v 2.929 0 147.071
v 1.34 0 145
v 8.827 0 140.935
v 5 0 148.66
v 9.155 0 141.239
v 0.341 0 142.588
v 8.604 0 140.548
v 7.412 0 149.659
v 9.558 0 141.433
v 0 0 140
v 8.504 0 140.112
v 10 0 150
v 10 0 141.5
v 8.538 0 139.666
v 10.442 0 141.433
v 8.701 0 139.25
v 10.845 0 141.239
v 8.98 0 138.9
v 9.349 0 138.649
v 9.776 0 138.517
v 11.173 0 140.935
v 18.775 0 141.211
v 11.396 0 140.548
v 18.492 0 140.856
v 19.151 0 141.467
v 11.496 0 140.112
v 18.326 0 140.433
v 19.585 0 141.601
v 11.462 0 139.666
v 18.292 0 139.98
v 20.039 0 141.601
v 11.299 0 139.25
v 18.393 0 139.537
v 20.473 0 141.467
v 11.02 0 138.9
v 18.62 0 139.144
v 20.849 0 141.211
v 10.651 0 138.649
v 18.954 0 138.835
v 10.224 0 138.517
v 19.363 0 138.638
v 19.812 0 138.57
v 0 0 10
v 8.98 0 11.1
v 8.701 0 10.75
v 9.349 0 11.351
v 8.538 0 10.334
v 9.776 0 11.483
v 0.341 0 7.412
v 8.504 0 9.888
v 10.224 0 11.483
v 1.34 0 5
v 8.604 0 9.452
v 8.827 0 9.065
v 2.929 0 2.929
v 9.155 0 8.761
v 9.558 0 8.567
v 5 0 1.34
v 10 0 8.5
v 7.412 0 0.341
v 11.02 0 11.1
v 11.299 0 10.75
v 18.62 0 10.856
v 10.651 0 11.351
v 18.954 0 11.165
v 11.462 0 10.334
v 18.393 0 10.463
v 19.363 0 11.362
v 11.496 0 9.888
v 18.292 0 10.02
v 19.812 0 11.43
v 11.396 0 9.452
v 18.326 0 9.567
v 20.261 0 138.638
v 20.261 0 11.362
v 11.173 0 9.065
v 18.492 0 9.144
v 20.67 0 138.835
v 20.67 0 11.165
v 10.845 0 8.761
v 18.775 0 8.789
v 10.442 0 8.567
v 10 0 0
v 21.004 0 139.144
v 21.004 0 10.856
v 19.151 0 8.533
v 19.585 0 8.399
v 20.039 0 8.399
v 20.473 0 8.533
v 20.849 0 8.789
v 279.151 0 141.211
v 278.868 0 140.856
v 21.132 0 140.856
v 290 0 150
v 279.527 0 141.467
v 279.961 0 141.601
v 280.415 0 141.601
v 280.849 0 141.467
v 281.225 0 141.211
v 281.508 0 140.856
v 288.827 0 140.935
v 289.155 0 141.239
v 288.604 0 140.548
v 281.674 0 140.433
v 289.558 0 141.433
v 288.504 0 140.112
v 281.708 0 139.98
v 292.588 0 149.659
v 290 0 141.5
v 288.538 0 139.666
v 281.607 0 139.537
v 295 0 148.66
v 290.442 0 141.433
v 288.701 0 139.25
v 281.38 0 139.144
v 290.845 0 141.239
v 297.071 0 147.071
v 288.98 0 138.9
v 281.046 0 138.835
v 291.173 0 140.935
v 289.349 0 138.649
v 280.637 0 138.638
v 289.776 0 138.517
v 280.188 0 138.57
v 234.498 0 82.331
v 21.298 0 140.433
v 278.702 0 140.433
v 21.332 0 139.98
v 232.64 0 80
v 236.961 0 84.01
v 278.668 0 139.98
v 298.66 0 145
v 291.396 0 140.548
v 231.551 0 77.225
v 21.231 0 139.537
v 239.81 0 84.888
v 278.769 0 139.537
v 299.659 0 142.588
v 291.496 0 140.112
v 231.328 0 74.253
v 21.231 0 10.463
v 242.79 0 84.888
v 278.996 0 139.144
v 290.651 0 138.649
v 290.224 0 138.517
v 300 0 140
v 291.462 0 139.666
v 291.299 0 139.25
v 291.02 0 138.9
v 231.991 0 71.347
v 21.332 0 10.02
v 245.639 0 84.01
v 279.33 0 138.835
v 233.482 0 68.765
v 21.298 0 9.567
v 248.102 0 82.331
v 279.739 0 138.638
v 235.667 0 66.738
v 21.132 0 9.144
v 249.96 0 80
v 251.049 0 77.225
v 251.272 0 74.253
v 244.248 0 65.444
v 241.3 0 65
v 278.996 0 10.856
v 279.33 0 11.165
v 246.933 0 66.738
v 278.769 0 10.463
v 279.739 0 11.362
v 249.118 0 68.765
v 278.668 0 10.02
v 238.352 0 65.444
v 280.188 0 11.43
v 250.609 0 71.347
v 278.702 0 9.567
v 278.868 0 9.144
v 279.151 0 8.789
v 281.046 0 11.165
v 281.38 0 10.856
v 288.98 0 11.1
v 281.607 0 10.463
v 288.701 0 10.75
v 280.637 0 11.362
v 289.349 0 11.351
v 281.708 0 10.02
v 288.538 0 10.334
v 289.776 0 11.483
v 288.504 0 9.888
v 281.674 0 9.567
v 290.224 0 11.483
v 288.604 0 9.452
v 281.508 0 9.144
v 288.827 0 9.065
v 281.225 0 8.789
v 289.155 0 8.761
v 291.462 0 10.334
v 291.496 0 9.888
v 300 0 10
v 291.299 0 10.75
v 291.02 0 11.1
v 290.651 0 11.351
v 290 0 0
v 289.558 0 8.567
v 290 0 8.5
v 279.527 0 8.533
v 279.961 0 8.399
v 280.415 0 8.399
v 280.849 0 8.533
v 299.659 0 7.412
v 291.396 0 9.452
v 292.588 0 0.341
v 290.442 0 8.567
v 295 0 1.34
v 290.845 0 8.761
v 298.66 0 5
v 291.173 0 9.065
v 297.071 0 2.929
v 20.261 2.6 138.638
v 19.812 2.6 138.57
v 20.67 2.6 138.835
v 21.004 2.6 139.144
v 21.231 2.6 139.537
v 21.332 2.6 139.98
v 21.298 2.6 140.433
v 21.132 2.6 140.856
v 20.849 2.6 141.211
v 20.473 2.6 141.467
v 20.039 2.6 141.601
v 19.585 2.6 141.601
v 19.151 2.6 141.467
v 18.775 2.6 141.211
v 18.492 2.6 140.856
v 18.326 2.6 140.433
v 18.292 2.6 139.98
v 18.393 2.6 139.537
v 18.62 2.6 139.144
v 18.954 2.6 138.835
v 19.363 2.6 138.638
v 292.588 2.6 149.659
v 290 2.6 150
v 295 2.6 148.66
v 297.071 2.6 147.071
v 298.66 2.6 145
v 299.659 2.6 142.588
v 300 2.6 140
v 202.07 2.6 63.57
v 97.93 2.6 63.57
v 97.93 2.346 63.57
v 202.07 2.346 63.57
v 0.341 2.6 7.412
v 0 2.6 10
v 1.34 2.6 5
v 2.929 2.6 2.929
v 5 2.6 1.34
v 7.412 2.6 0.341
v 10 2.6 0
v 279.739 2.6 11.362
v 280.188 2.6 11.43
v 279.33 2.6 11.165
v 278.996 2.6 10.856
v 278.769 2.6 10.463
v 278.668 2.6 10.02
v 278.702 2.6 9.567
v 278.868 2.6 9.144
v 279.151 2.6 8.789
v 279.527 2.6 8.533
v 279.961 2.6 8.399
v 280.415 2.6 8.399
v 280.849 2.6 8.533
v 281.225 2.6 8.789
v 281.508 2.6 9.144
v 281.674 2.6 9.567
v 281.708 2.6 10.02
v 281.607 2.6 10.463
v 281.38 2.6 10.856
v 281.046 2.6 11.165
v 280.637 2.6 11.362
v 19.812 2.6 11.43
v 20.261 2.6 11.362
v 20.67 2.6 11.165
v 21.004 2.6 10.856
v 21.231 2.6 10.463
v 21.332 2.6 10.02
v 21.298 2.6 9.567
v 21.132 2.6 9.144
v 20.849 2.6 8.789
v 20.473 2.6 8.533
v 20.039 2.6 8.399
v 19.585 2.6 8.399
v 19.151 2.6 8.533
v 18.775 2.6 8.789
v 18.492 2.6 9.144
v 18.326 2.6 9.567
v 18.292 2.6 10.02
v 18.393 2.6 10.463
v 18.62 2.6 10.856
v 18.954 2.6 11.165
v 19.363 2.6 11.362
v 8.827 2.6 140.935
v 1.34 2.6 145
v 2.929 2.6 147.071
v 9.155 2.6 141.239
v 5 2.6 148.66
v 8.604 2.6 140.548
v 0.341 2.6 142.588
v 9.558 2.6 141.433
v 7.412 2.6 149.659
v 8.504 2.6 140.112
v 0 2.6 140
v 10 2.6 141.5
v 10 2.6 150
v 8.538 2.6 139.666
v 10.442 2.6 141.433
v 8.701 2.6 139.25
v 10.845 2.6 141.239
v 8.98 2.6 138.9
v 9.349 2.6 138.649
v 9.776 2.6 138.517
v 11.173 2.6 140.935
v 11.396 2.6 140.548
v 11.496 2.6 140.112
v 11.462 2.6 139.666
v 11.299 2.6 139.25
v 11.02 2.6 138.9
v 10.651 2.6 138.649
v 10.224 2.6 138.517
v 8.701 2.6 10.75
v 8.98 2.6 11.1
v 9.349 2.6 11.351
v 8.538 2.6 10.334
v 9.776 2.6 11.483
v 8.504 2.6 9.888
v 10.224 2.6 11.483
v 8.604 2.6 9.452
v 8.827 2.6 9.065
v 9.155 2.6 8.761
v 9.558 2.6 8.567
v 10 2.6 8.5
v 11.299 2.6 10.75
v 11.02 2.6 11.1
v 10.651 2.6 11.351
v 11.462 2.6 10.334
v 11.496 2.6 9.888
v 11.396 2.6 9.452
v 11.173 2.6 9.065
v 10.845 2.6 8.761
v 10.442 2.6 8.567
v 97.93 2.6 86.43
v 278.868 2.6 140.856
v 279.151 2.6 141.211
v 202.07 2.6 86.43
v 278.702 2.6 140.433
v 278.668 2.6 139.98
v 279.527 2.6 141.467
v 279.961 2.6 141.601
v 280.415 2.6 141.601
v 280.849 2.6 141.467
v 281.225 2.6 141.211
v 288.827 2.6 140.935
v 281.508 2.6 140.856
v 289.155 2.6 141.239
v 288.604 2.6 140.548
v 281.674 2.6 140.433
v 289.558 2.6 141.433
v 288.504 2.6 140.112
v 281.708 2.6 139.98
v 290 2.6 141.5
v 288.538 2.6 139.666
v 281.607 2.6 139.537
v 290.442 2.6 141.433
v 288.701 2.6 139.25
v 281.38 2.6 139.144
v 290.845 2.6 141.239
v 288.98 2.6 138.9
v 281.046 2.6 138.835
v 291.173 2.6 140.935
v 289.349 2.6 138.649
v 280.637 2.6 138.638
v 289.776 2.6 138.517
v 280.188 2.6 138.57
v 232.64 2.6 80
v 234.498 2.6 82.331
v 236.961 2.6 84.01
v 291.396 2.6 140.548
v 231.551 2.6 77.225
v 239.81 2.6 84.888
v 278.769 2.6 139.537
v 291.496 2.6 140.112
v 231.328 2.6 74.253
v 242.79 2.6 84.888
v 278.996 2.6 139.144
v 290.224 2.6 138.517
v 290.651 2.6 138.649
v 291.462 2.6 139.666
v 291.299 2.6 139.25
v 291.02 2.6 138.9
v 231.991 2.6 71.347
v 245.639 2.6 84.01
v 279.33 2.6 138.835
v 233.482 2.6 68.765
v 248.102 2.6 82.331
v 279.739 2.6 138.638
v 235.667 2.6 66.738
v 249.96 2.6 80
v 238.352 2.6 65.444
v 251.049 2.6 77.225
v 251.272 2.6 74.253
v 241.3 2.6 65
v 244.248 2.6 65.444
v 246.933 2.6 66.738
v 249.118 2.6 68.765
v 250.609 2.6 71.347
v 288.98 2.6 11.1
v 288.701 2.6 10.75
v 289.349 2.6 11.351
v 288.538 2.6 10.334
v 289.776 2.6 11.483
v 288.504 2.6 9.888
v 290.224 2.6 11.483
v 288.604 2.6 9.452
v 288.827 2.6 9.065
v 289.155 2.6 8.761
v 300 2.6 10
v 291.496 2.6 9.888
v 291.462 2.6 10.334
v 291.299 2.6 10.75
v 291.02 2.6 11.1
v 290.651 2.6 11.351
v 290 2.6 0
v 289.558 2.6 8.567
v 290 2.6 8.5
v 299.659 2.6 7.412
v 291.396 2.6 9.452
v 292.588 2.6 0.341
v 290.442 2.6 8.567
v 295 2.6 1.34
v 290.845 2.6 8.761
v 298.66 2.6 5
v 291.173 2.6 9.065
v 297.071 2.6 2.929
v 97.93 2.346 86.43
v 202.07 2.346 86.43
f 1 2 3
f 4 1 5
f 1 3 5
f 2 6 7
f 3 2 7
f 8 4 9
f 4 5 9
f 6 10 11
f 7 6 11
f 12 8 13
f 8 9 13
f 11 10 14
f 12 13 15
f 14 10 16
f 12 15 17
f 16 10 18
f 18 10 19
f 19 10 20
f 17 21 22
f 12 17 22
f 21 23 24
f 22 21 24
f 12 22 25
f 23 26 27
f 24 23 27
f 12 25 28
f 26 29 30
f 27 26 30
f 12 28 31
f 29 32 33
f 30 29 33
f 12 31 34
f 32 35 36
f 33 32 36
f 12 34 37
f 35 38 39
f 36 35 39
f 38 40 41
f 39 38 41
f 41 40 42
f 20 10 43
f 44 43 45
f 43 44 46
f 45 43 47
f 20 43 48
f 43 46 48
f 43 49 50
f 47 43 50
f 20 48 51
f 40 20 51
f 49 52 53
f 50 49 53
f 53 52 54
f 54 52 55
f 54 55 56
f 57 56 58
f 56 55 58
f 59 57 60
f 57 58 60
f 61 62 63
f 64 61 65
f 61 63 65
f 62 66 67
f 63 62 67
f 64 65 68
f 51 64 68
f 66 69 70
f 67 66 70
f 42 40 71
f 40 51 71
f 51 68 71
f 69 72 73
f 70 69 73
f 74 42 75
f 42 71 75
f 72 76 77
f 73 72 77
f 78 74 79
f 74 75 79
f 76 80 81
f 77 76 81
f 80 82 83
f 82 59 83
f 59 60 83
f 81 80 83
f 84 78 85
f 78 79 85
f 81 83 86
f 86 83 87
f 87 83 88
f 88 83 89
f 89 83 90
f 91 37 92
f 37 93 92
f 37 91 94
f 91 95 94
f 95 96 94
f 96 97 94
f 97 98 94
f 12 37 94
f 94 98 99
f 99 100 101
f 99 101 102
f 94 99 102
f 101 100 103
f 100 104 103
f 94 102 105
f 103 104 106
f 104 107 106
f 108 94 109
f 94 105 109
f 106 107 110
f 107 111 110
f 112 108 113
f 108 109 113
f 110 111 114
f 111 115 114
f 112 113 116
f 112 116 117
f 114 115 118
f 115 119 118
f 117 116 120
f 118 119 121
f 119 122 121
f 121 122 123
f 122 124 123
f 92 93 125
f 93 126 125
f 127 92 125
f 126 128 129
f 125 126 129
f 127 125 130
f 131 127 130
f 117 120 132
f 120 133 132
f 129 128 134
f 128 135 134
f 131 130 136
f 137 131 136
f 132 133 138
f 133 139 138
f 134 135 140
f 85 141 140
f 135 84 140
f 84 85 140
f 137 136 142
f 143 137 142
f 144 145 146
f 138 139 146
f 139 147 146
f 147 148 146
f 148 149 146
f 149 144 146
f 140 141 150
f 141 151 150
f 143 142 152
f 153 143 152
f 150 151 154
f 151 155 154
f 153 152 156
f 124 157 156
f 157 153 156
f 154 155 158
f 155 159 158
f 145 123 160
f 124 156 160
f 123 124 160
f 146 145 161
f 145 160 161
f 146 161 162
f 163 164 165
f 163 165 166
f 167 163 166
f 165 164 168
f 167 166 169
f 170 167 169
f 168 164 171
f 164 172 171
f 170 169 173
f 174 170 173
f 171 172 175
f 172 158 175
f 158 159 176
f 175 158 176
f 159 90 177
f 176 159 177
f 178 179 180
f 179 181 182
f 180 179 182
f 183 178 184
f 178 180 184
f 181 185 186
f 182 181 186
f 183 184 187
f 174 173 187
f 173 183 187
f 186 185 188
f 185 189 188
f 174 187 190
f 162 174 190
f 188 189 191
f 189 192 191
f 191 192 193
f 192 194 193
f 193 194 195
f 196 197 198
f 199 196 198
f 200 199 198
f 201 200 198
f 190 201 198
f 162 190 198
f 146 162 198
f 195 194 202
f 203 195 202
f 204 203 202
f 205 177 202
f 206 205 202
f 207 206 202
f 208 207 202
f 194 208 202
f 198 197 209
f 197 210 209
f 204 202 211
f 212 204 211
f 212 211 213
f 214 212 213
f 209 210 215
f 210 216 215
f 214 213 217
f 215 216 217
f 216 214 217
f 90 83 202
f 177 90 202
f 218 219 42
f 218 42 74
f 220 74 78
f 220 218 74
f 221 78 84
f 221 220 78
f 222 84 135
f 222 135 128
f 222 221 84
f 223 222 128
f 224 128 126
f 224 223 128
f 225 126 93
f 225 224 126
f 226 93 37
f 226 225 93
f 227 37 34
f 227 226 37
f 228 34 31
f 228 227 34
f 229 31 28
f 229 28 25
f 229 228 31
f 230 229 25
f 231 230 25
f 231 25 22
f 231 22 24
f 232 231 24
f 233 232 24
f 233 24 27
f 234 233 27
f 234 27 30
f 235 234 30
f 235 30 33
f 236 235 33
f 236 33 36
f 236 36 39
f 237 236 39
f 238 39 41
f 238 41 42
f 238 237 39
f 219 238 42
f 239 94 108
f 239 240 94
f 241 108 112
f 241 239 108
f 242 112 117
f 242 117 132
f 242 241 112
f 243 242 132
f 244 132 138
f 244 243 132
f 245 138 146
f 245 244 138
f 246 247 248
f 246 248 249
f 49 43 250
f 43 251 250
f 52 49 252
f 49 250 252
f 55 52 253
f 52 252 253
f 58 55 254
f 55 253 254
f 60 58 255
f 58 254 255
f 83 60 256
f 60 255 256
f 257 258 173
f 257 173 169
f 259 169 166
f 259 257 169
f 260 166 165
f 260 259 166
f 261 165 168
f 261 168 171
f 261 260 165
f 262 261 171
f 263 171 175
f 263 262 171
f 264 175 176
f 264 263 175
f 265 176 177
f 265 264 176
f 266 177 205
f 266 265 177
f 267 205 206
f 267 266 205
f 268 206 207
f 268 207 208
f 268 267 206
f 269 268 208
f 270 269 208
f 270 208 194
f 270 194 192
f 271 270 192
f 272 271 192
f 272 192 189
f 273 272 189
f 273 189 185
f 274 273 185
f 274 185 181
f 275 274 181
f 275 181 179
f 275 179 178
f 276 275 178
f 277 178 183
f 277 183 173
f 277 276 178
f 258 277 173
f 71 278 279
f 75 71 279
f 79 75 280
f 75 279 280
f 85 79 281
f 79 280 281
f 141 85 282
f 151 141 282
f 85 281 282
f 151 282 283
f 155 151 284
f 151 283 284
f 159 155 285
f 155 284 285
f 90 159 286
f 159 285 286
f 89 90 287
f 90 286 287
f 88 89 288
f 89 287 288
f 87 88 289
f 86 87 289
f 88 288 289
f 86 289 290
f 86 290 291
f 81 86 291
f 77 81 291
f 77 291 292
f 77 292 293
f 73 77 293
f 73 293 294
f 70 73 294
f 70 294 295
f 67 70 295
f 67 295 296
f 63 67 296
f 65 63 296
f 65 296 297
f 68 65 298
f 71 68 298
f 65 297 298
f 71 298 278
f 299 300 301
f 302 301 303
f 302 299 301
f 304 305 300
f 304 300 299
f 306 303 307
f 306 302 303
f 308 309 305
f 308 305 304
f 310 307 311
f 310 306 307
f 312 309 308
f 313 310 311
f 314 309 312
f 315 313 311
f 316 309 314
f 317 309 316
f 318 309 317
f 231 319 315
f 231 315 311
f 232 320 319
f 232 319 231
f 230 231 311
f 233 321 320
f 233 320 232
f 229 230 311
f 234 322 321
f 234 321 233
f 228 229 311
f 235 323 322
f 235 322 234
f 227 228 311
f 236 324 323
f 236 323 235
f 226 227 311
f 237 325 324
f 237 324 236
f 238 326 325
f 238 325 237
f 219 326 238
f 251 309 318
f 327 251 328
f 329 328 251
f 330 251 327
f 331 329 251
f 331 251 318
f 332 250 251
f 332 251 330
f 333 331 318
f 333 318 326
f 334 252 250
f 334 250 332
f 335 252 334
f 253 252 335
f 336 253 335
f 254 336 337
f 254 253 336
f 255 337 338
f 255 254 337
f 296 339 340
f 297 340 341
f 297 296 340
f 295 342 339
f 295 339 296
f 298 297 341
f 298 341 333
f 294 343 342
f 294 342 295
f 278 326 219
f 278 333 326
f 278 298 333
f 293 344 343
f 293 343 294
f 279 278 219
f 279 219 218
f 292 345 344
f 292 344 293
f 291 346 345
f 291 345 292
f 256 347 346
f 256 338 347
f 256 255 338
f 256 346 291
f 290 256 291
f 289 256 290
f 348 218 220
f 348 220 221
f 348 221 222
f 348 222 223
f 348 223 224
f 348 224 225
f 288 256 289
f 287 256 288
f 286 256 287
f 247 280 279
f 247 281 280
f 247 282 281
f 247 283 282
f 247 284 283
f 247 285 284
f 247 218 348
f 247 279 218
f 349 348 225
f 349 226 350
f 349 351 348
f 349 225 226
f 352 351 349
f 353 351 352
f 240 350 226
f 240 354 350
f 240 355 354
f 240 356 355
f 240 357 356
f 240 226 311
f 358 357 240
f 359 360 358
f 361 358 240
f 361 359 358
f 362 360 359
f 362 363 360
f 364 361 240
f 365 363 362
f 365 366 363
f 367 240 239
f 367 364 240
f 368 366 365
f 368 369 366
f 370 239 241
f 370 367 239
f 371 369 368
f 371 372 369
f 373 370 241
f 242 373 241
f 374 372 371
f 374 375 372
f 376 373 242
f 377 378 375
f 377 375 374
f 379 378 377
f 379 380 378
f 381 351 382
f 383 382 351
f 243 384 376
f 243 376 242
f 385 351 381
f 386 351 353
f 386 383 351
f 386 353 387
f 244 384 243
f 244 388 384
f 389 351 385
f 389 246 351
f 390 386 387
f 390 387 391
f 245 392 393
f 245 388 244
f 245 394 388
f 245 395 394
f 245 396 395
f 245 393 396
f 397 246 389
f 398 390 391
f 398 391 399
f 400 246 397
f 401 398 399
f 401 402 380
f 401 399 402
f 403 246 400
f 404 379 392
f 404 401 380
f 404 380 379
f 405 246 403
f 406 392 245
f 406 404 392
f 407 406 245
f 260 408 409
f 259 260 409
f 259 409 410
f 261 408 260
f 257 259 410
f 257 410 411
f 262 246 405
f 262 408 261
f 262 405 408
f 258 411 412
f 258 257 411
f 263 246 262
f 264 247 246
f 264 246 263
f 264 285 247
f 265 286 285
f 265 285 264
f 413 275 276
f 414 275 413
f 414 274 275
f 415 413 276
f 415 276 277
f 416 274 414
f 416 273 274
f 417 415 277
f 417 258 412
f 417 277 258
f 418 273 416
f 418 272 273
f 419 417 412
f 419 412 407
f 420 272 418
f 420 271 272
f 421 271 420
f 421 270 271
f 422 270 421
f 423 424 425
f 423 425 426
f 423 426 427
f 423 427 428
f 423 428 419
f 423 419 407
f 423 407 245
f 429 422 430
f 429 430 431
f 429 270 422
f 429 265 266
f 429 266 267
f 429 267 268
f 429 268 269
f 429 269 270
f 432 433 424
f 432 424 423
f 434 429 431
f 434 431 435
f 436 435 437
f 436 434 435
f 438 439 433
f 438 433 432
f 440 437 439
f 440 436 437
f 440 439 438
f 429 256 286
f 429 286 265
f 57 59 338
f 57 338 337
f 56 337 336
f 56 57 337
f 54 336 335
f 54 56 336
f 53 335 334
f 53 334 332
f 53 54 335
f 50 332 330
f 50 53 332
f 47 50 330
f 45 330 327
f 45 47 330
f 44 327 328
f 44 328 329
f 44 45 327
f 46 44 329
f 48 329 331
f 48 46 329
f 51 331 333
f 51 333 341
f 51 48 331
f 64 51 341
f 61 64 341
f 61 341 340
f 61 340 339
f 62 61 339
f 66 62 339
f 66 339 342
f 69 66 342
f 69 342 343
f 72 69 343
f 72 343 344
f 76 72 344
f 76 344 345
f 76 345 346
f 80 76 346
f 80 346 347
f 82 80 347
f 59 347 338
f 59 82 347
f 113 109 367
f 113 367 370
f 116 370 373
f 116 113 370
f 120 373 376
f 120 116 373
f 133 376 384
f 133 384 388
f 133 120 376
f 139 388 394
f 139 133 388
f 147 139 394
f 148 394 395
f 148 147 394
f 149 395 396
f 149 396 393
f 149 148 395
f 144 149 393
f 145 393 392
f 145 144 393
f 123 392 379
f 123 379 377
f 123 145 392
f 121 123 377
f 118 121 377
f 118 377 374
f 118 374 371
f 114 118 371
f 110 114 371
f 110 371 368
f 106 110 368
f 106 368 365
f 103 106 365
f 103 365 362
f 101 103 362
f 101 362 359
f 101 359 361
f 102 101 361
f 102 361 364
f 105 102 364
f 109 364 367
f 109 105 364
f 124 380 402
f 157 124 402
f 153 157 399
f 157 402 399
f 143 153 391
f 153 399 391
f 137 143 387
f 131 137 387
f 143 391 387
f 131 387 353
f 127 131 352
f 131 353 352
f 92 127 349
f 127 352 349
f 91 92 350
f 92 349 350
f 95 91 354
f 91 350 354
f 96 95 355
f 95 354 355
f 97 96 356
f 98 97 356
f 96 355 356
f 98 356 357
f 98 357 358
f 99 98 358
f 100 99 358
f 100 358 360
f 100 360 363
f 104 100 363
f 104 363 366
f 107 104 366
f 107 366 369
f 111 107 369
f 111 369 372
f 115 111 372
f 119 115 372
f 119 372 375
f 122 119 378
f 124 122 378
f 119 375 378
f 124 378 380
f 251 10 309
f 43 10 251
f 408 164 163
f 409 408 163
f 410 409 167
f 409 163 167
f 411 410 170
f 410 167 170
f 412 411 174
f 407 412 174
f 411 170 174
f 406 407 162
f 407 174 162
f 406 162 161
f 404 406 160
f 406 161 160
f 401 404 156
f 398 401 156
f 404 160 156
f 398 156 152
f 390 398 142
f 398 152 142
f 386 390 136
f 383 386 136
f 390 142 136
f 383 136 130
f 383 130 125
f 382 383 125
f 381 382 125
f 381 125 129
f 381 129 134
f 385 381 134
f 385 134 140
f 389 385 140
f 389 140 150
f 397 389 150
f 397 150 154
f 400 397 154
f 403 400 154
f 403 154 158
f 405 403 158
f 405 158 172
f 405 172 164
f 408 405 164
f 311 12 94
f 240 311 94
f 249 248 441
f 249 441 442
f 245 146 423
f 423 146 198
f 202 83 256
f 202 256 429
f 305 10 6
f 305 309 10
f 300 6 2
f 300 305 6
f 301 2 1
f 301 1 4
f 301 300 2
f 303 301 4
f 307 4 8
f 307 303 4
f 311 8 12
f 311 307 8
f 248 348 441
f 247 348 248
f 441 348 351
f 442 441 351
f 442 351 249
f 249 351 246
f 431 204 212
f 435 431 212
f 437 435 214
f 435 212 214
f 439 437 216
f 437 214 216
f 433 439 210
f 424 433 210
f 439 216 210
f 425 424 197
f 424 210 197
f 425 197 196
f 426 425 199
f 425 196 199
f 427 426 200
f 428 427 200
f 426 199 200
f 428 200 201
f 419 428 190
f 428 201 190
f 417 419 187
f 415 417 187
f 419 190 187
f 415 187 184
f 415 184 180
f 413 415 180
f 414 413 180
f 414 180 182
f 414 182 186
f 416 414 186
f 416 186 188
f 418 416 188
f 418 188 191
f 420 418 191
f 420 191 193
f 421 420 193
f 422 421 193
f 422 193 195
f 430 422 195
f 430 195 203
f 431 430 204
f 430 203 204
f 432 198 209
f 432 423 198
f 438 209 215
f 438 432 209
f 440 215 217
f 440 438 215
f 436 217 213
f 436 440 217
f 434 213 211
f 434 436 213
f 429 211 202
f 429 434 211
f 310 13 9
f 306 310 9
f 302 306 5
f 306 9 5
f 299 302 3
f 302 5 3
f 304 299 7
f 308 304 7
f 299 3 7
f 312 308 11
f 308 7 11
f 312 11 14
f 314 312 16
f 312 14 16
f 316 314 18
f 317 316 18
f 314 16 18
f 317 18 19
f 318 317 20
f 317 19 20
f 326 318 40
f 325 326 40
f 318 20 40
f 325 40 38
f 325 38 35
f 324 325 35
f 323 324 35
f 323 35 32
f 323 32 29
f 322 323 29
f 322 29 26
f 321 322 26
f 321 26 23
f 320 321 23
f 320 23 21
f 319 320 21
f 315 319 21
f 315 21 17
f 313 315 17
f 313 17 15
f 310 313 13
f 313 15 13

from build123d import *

# Parameters (mm, degrees)
SKETCH1_W               = 300
SKETCH1_H               = 150
BOSS_EXTRUDE1_DEPTH     = 2.6
FILLET1_R               = 10
SKETCH6_R               = 1.5
CUT_EXTRUDE6_DEPTH      = 2.6
MIRROR6_COPY_1_SKETCH_R = 1.5
MIRROR6_COPY_1_DEPTH    = 2.6
SKETCH23_R              = 1.524
CUT_EXTRUDE16_DEPTH     = 2.59999988
MIRROR8_COPY_1_SKETCH_R = 1.524
MIRROR8_COPY_1_DEPTH    = 2.59999988
SKETCH15_R              = 10
CUT_EXTRUDE19_DEPTH     = 336.420273687
SKETCH25_W              = 104.14
SKETCH25_H              = 22.86
CUT_EXTRUDE20_DEPTH     = 0.254


with BuildPart() as part:
    # Sketch1 → Boss-Extrude1 (new body)
    with BuildSketch(Plane(origin=(0, 0, 0), x_dir=(1, 0, 0), z_dir=(0, 1, 0))):
        with Locations((150, -75)):
            Rectangle(SKETCH1_W, SKETCH1_H)
    extrude(amount=BOSS_EXTRUDE1_DEPTH)

    # Fillet1
    fillet1_edges = [part.edges().sort_by_distance(p)[0] for p in [
        (0, 1.3, 0),
        (300, 1.3, 0),
        (300, 1.3, 150),
        (0, 1.3, 150),
    ]]
    fillet(fillet1_edges, radius=FILLET1_R)

    # Sketch6 → Cut-Extrude6 (cut)
    with BuildSketch(Plane.XZ):
        with Locations(Location((290, 10, 0), (0, 0, 270))):
            Circle(SKETCH6_R)
    cut_extrude6 = extrude(amount=-CUT_EXTRUDE6_DEPTH, mode=Mode.SUBTRACT)

    # Mirror5: Cut-Extrude6 across plane
    add(cut_extrude6.mirror(Plane(origin=(150, 0, 0), x_dir=(0, 0, 1), z_dir=(1, 0, 0))), mode=Mode.SUBTRACT)

    # Mirror6: Cut-Extrude6 across plane
    add(cut_extrude6.mirror(Plane.XY.offset(75)), mode=Mode.SUBTRACT)

    # Mirror6 copy 1 sketch → Mirror6 copy 1 (cut)
    with BuildSketch(Plane(origin=(300, 0, 150), x_dir=(-1, 0, 0), z_dir=(0, -1, 0))):
        with Locations(Location((290, 10, 0), (0, 0, 270))):
            Circle(MIRROR6_COPY_1_SKETCH_R)
    extrude(amount=-MIRROR6_COPY_1_DEPTH, mode=Mode.SUBTRACT)

    # Sketch23 → Cut-Extrude16 (cut)
    with BuildSketch(Plane(origin=(0, 2.6, 0), x_dir=(1, 0, 0), z_dir=(0, 1, 0))):
        with Locations(Location((19.812, -9.906, 0), (0, 0, 270))):
            Circle(SKETCH23_R)
    cut_extrude16 = extrude(amount=-CUT_EXTRUDE16_DEPTH, mode=Mode.SUBTRACT)

    # Mirror7: Cut-Extrude16 across plane
    add(cut_extrude16.mirror(Plane(origin=(150, 0, 0), x_dir=(0, 0, 1), z_dir=(1, 0, 0))), mode=Mode.SUBTRACT)

    # Mirror8: Cut-Extrude16 across plane
    add(cut_extrude16.mirror(Plane.XY.offset(75)), mode=Mode.SUBTRACT)

    # Mirror8 copy 1 sketch → Mirror8 copy 1 (cut)
    with BuildSketch(Plane(origin=(300, 2.6, 150), x_dir=(-1, 0, 0), z_dir=(0, 1, 0))):
        with Locations(Location((19.812, -9.906, 0), (0, 0, 270))):
            Circle(MIRROR8_COPY_1_SKETCH_R)
    extrude(amount=-MIRROR8_COPY_1_DEPTH, mode=Mode.SUBTRACT)

    # Sketch15 → Cut-Extrude19 (cut, through all)
    with BuildSketch(Plane.XZ):
        with Locations(Location((241.3, 75, 0), (0, 0, 270))):
            Circle(SKETCH15_R)
    extrude(amount=-CUT_EXTRUDE19_DEPTH, mode=Mode.SUBTRACT)

    # Sketch25 → Cut-Extrude20 (cut)
    with BuildSketch(Plane(origin=(0, 2.6, 0), x_dir=(1, 0, 0), z_dir=(0, 1, 0))):
        with Locations((150, -75)):
            Rectangle(SKETCH25_W, SKETCH25_H)
    extrude(amount=-CUT_EXTRUDE20_DEPTH, mode=Mode.SUBTRACT)


solid = part.part
